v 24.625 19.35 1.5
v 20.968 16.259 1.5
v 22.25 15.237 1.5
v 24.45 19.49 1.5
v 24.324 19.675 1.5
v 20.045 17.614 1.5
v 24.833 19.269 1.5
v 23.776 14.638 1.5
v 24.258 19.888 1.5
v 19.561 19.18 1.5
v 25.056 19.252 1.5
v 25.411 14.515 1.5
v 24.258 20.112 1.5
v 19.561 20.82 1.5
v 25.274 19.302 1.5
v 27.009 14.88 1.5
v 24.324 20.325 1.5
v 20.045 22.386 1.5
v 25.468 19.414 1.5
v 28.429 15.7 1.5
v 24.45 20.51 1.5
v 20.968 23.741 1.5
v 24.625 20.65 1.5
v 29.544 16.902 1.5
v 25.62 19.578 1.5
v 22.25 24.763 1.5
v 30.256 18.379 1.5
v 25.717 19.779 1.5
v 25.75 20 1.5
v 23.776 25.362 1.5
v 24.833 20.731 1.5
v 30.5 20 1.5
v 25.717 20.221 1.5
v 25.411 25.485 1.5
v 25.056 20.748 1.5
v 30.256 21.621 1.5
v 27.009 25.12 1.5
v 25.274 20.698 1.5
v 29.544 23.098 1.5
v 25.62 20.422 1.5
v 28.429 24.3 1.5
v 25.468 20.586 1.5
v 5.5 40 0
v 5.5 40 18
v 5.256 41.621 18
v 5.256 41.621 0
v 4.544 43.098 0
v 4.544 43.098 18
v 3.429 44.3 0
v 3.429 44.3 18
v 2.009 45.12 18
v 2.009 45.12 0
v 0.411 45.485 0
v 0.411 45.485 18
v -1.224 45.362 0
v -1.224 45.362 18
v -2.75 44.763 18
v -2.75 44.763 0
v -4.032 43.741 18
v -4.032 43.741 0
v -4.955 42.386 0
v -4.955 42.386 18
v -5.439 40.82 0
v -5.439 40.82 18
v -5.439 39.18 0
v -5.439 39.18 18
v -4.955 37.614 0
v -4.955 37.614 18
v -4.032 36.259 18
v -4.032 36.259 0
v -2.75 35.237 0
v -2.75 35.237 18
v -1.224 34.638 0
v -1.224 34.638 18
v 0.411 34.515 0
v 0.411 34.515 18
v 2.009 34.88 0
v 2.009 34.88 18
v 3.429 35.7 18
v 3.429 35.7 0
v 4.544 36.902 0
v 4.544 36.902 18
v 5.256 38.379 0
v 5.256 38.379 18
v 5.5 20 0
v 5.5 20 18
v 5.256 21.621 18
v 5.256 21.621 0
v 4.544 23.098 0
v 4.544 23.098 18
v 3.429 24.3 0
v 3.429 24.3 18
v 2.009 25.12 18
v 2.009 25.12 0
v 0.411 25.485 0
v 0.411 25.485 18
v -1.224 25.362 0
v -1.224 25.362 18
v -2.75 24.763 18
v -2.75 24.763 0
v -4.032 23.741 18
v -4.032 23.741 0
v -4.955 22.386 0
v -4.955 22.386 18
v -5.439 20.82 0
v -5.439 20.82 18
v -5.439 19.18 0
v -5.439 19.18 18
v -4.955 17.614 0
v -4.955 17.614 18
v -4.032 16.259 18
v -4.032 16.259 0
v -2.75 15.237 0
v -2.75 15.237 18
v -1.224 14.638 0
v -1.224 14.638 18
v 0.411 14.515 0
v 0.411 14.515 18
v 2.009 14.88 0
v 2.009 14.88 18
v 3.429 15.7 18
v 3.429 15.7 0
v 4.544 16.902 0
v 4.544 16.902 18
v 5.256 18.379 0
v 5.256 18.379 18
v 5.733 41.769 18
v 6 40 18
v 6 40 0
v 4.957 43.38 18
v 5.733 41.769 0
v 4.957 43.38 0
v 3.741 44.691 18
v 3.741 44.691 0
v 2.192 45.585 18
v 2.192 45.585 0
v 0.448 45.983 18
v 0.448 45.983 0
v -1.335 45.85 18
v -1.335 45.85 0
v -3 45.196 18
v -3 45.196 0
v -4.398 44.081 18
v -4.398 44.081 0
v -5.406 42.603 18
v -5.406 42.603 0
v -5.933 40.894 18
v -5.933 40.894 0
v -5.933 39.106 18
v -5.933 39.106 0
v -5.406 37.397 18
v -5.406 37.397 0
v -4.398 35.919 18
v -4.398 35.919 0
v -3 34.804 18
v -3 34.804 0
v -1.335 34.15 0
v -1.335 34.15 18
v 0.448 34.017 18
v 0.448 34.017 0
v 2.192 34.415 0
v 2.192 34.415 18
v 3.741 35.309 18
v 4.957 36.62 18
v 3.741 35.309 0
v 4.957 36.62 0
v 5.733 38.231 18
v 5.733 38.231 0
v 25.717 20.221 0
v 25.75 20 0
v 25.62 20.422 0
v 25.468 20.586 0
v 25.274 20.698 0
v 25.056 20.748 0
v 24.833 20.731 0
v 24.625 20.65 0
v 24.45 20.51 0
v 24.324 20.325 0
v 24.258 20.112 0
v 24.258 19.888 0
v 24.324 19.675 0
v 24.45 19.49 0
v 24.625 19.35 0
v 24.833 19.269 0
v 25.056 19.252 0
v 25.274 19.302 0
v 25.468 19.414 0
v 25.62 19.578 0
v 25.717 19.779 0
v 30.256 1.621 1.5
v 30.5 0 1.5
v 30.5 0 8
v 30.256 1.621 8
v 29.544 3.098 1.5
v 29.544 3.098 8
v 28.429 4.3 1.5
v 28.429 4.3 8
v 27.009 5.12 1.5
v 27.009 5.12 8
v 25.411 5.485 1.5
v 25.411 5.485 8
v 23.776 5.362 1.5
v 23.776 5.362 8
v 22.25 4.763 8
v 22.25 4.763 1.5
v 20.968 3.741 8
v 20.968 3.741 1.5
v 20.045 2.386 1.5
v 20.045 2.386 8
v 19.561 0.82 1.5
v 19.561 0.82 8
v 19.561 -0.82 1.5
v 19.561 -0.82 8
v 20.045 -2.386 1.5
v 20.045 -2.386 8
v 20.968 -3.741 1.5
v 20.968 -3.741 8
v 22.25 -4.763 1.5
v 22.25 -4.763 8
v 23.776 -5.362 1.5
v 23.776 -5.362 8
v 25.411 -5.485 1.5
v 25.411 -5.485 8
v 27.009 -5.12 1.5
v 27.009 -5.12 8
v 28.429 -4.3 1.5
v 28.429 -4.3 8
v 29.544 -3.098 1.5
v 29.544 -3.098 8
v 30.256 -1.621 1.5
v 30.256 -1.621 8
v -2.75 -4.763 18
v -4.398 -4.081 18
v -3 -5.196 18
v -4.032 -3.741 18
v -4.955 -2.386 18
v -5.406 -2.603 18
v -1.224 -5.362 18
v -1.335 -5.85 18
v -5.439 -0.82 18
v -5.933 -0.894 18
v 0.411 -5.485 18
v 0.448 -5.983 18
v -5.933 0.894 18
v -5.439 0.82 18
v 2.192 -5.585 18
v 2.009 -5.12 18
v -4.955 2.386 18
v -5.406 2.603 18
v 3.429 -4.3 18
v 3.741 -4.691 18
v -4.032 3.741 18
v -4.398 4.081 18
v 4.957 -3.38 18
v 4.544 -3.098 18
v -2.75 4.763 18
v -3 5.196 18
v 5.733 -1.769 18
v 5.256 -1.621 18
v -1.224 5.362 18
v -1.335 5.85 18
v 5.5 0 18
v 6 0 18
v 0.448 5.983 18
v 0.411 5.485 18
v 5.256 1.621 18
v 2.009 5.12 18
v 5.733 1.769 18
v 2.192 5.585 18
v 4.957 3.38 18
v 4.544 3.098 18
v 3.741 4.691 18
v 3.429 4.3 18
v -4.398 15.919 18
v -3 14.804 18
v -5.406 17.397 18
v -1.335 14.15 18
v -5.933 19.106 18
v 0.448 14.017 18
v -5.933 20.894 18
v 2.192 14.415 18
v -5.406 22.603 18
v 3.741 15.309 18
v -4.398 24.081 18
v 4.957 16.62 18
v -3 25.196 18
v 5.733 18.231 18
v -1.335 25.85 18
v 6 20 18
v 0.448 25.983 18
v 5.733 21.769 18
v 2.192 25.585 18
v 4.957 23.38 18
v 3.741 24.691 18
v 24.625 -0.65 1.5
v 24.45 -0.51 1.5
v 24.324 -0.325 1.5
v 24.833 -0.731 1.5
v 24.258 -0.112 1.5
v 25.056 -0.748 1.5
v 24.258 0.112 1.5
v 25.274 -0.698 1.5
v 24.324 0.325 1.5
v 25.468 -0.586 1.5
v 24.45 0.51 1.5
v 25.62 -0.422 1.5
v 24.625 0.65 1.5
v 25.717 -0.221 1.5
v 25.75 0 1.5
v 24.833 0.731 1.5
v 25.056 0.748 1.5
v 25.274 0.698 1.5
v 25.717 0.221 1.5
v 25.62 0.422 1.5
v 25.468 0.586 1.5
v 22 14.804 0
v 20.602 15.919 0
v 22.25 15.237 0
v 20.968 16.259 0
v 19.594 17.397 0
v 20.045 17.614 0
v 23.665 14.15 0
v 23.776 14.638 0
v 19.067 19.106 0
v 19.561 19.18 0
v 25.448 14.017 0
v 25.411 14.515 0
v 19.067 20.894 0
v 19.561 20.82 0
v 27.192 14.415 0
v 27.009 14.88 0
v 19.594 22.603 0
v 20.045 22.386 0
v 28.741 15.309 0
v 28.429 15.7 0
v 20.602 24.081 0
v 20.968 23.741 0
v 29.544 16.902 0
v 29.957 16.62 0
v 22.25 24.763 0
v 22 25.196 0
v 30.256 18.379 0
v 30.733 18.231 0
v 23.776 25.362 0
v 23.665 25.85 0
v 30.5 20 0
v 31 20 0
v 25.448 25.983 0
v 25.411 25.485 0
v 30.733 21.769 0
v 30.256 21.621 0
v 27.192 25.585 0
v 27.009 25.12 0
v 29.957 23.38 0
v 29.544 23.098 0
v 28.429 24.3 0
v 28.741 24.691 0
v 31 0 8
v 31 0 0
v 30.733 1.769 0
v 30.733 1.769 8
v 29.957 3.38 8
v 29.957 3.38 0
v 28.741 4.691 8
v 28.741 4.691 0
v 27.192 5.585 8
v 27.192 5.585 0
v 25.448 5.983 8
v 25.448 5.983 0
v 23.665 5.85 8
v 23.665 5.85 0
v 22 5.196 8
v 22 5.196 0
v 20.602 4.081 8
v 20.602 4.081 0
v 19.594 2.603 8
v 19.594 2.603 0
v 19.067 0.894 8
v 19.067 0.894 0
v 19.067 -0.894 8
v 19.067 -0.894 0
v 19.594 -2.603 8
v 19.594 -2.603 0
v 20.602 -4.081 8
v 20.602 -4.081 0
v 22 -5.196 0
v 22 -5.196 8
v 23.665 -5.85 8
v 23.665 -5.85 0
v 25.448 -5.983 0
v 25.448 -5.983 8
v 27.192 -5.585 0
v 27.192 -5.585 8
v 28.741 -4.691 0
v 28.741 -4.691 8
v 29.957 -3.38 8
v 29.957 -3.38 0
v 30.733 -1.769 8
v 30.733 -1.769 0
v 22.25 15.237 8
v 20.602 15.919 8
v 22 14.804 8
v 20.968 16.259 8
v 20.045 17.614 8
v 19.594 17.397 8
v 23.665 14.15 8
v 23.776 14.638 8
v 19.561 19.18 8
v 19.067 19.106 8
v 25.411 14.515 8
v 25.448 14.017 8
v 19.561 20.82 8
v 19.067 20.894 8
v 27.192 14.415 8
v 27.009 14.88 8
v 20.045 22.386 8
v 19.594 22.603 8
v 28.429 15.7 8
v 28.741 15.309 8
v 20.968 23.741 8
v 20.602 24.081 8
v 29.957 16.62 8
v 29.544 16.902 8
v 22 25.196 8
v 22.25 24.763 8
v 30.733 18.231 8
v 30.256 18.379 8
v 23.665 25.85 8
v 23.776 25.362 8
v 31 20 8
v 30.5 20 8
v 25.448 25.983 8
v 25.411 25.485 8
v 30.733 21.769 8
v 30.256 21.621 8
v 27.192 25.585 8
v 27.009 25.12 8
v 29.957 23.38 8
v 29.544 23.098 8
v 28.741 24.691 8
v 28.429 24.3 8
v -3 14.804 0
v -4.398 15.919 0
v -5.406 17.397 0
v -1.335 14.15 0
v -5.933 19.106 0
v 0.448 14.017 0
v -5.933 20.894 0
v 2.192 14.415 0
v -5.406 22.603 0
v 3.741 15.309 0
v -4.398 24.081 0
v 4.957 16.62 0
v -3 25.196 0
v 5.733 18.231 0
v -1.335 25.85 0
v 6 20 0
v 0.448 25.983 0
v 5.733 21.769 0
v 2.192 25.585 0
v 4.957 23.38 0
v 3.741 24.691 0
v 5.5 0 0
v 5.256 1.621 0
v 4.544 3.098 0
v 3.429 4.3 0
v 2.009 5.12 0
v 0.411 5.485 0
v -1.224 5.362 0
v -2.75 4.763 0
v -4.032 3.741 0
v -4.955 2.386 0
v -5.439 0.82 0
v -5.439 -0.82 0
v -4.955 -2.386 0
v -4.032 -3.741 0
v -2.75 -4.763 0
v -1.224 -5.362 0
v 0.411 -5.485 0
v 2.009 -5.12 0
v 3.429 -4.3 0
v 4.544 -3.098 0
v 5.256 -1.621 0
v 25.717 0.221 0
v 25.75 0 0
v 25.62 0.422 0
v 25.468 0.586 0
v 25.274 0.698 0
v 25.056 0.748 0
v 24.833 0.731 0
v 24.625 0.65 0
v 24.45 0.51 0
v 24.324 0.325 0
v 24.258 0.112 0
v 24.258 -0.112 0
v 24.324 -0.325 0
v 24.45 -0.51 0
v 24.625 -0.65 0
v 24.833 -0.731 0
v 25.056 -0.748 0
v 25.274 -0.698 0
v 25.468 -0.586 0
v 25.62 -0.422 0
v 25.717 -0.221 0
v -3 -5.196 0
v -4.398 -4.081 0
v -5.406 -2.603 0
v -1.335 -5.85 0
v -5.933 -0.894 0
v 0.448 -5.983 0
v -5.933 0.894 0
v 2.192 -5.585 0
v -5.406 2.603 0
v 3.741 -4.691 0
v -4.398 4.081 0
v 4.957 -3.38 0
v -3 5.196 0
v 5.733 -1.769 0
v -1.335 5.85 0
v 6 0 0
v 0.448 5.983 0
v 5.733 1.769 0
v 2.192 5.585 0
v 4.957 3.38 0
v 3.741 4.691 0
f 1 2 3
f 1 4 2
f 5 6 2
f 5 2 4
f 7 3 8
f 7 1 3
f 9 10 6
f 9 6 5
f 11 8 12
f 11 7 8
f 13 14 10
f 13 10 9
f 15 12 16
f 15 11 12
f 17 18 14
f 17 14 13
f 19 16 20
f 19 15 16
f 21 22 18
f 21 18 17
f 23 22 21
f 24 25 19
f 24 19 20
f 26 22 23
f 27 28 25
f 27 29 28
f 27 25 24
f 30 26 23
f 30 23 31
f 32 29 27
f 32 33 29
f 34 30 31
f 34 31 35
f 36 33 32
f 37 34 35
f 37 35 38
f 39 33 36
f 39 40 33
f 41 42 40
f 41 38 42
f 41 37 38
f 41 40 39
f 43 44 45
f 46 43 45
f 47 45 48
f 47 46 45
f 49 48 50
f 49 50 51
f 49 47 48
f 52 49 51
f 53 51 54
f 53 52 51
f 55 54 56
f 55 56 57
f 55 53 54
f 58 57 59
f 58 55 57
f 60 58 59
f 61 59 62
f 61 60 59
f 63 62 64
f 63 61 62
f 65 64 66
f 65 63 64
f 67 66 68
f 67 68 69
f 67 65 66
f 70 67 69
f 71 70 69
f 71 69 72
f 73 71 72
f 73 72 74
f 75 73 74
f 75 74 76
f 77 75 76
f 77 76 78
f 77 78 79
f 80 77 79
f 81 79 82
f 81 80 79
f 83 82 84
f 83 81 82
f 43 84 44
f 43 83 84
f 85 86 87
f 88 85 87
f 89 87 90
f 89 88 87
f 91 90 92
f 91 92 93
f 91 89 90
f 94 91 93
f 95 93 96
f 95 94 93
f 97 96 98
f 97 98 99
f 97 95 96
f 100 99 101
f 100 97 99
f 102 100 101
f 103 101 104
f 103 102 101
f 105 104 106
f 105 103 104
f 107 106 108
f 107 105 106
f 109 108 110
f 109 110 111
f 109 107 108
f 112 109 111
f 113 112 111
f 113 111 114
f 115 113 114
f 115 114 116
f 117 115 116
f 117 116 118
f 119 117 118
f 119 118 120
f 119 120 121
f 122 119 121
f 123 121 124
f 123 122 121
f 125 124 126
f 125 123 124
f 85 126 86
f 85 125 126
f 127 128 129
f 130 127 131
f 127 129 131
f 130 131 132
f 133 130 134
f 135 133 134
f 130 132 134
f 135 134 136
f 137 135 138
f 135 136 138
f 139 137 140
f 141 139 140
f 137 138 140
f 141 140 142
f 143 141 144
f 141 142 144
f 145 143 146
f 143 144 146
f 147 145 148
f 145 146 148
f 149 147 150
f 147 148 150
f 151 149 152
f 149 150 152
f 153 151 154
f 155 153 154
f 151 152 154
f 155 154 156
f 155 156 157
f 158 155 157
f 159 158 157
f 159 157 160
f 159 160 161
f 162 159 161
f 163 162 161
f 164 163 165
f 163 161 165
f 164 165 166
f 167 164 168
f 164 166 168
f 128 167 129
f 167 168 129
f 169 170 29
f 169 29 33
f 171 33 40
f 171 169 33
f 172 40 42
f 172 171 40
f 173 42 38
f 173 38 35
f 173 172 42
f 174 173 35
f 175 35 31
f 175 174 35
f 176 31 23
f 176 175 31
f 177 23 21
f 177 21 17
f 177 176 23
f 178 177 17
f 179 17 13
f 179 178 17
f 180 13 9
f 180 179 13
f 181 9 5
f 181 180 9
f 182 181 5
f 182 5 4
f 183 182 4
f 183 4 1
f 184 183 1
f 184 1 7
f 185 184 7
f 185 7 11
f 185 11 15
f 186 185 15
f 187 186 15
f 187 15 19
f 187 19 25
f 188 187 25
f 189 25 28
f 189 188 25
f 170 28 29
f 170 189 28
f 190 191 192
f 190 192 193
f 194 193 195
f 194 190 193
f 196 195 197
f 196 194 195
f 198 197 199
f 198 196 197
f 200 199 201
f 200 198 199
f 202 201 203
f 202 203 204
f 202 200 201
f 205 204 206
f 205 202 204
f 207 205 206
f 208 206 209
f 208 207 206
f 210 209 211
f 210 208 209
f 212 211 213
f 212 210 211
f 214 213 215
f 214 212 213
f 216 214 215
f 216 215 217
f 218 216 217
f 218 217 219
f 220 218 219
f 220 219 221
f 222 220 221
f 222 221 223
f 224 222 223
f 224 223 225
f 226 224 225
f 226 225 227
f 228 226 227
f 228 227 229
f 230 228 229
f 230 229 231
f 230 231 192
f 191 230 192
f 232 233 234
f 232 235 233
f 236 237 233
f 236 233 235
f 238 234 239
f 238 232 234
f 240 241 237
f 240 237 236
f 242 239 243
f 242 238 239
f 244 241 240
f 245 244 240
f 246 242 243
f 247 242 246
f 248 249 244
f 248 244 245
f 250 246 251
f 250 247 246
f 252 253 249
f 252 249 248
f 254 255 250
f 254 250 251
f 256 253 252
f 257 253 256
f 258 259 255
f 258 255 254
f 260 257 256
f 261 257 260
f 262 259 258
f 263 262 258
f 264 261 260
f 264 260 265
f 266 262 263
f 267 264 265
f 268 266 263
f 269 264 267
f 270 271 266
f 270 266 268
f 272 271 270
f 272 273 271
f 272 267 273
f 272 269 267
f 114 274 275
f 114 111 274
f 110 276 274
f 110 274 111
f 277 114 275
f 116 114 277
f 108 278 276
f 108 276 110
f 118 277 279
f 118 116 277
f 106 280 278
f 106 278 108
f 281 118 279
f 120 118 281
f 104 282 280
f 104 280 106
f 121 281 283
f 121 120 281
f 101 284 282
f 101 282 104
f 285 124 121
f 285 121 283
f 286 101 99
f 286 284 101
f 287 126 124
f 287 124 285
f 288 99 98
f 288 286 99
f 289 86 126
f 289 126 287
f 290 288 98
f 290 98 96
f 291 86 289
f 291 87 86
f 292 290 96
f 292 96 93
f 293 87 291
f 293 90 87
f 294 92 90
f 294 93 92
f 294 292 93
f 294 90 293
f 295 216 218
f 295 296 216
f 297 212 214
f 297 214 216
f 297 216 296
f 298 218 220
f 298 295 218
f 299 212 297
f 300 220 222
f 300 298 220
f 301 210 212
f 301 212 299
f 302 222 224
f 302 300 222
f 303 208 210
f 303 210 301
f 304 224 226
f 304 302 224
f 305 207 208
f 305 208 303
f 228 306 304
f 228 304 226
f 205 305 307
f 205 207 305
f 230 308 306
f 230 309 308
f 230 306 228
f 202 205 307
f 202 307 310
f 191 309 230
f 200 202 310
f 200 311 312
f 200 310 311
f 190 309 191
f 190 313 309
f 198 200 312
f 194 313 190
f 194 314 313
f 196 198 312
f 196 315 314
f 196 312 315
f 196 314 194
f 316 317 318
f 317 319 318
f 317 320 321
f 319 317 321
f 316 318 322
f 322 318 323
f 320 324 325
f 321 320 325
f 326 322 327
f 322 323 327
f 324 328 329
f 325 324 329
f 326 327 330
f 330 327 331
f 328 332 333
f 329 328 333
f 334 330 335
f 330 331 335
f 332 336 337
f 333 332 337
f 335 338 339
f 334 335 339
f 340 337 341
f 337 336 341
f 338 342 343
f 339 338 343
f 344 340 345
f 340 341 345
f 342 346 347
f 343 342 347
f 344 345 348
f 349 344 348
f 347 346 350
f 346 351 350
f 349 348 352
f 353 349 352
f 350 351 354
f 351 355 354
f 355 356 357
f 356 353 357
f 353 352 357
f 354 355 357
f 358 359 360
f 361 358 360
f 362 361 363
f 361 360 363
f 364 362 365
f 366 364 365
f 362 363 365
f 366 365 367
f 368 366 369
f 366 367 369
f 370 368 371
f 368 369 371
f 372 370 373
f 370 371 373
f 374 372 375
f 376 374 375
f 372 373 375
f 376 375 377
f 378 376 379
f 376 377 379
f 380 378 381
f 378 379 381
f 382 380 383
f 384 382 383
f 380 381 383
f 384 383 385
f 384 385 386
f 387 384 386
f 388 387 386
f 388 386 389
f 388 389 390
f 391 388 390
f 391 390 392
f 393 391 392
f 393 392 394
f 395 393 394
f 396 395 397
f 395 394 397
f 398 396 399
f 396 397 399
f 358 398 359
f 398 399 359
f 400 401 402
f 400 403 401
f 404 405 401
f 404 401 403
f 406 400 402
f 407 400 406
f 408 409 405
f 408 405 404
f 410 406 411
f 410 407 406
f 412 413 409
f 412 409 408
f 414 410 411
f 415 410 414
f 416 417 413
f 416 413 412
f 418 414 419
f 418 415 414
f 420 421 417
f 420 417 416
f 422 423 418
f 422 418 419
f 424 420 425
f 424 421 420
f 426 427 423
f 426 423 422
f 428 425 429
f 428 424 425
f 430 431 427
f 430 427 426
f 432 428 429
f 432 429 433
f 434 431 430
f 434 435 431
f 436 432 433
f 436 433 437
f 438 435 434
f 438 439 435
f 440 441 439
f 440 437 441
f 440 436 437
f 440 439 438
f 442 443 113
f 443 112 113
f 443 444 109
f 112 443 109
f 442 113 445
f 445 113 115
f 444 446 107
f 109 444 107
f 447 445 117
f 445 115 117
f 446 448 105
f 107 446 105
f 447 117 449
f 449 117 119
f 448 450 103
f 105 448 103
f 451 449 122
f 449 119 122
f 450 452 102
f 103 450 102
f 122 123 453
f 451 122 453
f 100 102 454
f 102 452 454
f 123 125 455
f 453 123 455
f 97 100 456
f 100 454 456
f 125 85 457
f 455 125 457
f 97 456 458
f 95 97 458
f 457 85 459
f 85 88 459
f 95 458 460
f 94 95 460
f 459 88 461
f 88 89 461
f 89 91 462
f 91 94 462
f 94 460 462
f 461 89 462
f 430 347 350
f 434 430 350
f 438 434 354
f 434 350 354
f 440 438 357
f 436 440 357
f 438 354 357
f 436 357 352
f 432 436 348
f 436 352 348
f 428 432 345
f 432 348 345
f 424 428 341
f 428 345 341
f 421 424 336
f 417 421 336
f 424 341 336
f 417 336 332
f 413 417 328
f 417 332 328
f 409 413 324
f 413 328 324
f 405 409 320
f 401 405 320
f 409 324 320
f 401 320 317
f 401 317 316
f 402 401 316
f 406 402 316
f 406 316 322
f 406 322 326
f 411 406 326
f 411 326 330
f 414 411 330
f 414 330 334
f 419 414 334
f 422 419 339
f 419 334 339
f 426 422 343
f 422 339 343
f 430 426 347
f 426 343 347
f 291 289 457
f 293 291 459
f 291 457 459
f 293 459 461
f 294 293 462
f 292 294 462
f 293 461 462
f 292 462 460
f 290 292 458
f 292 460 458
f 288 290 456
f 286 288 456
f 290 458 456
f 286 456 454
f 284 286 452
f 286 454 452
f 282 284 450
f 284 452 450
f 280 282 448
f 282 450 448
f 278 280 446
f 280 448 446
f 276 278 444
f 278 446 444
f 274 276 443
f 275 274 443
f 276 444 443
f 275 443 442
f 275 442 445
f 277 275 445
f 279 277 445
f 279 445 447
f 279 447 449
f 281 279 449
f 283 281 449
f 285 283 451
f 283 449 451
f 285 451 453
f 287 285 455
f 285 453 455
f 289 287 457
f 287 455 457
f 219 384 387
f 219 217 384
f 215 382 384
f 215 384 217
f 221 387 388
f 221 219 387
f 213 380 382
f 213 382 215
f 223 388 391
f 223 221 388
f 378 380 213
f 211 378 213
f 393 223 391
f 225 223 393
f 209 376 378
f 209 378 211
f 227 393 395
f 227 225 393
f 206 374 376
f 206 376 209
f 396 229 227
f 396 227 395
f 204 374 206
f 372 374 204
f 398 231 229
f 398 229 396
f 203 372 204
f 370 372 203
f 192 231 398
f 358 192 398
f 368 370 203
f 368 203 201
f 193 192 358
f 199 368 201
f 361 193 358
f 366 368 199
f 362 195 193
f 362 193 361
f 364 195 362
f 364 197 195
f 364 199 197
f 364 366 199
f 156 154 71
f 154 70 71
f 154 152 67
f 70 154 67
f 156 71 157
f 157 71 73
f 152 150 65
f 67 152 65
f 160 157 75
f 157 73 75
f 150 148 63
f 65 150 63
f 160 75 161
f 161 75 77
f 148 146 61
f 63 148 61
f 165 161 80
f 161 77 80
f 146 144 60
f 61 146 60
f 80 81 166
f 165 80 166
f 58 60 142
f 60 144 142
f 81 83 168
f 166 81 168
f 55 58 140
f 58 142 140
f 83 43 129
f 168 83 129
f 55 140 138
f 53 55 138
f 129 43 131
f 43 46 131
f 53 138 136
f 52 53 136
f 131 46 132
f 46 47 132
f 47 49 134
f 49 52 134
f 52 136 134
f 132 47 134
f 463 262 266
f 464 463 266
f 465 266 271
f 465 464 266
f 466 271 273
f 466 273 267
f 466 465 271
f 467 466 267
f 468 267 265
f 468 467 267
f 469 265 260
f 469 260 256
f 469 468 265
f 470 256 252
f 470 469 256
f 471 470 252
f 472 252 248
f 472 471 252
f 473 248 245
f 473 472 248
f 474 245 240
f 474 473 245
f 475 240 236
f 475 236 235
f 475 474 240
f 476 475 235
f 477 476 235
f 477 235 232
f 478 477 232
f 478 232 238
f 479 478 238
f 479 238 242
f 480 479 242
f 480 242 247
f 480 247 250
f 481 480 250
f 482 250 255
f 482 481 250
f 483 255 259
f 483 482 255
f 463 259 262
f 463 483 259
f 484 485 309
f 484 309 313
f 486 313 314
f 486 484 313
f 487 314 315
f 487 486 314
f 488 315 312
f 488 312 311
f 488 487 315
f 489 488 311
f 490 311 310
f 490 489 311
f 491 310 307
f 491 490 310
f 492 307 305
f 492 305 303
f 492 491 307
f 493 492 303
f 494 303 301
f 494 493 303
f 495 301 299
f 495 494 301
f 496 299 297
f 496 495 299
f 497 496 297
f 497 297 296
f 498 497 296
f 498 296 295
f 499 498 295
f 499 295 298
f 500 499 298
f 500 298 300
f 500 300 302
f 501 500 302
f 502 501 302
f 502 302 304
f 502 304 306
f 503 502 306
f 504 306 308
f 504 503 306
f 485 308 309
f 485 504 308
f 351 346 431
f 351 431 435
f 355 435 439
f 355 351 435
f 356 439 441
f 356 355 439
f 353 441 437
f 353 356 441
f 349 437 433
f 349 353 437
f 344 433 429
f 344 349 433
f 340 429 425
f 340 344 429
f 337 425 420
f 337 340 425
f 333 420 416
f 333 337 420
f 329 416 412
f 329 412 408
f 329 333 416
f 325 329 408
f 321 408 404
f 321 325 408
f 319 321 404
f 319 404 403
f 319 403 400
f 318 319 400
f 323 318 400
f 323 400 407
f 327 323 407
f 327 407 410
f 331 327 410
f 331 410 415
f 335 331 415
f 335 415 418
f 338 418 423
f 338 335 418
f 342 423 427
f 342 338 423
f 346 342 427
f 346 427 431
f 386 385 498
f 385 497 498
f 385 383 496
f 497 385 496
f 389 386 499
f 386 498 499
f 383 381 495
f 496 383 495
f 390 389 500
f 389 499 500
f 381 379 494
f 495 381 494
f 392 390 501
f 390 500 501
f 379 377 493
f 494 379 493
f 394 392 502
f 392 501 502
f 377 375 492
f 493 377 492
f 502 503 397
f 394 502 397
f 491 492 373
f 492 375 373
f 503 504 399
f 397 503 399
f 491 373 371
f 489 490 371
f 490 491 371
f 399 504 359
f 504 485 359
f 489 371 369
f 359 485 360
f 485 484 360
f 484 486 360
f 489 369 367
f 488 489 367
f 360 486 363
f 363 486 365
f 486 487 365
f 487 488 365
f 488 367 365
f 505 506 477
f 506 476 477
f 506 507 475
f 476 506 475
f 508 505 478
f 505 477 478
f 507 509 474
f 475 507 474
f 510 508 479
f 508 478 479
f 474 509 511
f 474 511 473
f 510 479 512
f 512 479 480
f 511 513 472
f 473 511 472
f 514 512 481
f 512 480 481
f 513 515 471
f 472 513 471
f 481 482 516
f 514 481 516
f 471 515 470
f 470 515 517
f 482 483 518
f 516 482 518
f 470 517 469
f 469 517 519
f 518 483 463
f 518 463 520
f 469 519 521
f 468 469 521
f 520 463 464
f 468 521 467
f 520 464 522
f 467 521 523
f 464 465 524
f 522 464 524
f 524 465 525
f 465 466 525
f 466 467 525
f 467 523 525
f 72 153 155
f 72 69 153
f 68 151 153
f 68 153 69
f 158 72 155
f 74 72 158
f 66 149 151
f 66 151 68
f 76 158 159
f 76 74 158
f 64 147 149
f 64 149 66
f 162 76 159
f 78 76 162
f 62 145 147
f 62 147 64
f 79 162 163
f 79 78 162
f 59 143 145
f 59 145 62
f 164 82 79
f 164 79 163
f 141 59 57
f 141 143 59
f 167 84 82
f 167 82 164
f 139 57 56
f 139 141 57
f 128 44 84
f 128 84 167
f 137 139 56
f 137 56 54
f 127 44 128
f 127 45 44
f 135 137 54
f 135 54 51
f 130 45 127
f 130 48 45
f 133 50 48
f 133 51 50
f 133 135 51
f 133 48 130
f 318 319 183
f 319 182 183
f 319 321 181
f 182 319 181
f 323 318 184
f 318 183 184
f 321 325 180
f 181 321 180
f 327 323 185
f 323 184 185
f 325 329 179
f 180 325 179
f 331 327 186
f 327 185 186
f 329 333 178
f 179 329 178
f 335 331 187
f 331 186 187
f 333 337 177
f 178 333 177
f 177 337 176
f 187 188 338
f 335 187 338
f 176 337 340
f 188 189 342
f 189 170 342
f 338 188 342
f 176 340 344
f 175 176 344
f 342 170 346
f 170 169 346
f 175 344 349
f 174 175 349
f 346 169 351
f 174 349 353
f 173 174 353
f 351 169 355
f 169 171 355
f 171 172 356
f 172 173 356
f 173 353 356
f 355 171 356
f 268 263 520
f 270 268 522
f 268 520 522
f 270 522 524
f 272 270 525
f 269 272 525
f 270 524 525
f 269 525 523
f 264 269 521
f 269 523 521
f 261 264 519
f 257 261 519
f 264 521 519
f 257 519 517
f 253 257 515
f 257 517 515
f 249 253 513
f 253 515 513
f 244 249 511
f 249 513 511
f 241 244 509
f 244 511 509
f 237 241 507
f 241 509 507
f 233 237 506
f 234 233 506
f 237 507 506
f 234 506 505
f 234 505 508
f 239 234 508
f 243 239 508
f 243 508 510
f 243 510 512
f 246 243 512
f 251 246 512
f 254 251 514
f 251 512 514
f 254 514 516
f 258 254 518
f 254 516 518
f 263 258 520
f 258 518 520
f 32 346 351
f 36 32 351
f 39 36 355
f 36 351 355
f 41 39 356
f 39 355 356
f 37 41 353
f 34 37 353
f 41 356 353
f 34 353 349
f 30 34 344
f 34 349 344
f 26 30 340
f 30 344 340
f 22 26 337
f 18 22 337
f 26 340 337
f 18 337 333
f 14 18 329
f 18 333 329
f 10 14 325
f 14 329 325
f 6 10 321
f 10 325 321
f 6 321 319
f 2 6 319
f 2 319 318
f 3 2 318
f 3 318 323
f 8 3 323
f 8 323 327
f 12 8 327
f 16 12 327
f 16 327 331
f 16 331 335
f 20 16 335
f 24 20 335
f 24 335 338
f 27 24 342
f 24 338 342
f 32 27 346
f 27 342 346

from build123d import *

# Parameters (mm, degrees)
F0_R     = 6
F0_R_2   = 5.5
F1_DEPTH = 18
F2_DEPTH = 8
F0_R_3   = 2.4
F0_R_4   = 1.9
F0_R_5   = 0.75
F3_DEPTH = 1.5


with BuildPart() as f1:
    # F0 (on Top) → F1 (new body)
    with BuildSketch(Plane.XY):
        Circle(F0_R)
        Circle(F0_R_2, mode=Mode.SUBTRACT)
    extrude(amount=F1_DEPTH)


with BuildPart() as f1b:
    # F0 (on Top) → F1, piece 2 (new body)
    with BuildSketch(Plane.XY):
        with Locations((0, 20)):
            Circle(F0_R)
        with Locations((0, 20)):
            Circle(F0_R_2, mode=Mode.SUBTRACT)
    extrude(amount=F1_DEPTH)


with BuildPart() as f1c:
    # F0 (on Top) → F1, piece 3 (new body)
    with BuildSketch(Plane.XY):
        with Locations((0, 40)):
            Circle(F0_R)
        with Locations((0, 40)):
            Circle(F0_R_2, mode=Mode.SUBTRACT)
    extrude(amount=F1_DEPTH)


with BuildPart() as f2:
    # F0 (on Top) → F2 (new body)
    with BuildSketch(Plane.XY):
        with Locations((25, 0)):
            Circle(F0_R)
        with Locations((25, 0)):
            Circle(F0_R_2, mode=Mode.SUBTRACT)
    extrude(amount=F2_DEPTH)

    # F0 (on Top) → F3 (join)
    with BuildSketch(Plane.XY):
        with Locations((25, 0)):
            Circle(F0_R_2)
        with Locations((25, 0)):
            Circle(F0_R_3, mode=Mode.SUBTRACT)
        with Locations((25, 0)):
            Circle(F0_R_3)
        with Locations((25, 0)):
            Circle(F0_R_4, mode=Mode.SUBTRACT)
        with Locations((25, 0)):
            Circle(F0_R_4)
        with Locations((25, 0)):
            Circle(F0_R_5, mode=Mode.SUBTRACT)
    extrude(amount=F3_DEPTH)


with BuildPart() as f2b:
    # F0 (on Top) → F2, piece 2 (new body)
    with BuildSketch(Plane.XY):
        with Locations((25, 20)):
            Circle(F0_R)
        with Locations((25, 20)):
            Circle(F0_R_2, mode=Mode.SUBTRACT)
    extrude(amount=F2_DEPTH)


with BuildPart() as f3:
    # F0 (on Top) → F3, piece 2 (new body)
    with BuildSketch(Plane.XY):
        with Locations((25, 20)):
            Circle(F0_R_2)
        with Locations((25, 20)):
            Circle(F0_R_3, mode=Mode.SUBTRACT)
        with Locations((25, 20)):
            Circle(F0_R_3)
        with Locations((25, 20)):
            Circle(F0_R_4, mode=Mode.SUBTRACT)
        with Locations((25, 20)):
            Circle(F0_R_4)
        with Locations((25, 20)):
            Circle(F0_R_5, mode=Mode.SUBTRACT)
    extrude(amount=F3_DEPTH)


solid = Compound([f1.part, f1b.part, f1c.part, f2.part, f2b.part, f3.part])
